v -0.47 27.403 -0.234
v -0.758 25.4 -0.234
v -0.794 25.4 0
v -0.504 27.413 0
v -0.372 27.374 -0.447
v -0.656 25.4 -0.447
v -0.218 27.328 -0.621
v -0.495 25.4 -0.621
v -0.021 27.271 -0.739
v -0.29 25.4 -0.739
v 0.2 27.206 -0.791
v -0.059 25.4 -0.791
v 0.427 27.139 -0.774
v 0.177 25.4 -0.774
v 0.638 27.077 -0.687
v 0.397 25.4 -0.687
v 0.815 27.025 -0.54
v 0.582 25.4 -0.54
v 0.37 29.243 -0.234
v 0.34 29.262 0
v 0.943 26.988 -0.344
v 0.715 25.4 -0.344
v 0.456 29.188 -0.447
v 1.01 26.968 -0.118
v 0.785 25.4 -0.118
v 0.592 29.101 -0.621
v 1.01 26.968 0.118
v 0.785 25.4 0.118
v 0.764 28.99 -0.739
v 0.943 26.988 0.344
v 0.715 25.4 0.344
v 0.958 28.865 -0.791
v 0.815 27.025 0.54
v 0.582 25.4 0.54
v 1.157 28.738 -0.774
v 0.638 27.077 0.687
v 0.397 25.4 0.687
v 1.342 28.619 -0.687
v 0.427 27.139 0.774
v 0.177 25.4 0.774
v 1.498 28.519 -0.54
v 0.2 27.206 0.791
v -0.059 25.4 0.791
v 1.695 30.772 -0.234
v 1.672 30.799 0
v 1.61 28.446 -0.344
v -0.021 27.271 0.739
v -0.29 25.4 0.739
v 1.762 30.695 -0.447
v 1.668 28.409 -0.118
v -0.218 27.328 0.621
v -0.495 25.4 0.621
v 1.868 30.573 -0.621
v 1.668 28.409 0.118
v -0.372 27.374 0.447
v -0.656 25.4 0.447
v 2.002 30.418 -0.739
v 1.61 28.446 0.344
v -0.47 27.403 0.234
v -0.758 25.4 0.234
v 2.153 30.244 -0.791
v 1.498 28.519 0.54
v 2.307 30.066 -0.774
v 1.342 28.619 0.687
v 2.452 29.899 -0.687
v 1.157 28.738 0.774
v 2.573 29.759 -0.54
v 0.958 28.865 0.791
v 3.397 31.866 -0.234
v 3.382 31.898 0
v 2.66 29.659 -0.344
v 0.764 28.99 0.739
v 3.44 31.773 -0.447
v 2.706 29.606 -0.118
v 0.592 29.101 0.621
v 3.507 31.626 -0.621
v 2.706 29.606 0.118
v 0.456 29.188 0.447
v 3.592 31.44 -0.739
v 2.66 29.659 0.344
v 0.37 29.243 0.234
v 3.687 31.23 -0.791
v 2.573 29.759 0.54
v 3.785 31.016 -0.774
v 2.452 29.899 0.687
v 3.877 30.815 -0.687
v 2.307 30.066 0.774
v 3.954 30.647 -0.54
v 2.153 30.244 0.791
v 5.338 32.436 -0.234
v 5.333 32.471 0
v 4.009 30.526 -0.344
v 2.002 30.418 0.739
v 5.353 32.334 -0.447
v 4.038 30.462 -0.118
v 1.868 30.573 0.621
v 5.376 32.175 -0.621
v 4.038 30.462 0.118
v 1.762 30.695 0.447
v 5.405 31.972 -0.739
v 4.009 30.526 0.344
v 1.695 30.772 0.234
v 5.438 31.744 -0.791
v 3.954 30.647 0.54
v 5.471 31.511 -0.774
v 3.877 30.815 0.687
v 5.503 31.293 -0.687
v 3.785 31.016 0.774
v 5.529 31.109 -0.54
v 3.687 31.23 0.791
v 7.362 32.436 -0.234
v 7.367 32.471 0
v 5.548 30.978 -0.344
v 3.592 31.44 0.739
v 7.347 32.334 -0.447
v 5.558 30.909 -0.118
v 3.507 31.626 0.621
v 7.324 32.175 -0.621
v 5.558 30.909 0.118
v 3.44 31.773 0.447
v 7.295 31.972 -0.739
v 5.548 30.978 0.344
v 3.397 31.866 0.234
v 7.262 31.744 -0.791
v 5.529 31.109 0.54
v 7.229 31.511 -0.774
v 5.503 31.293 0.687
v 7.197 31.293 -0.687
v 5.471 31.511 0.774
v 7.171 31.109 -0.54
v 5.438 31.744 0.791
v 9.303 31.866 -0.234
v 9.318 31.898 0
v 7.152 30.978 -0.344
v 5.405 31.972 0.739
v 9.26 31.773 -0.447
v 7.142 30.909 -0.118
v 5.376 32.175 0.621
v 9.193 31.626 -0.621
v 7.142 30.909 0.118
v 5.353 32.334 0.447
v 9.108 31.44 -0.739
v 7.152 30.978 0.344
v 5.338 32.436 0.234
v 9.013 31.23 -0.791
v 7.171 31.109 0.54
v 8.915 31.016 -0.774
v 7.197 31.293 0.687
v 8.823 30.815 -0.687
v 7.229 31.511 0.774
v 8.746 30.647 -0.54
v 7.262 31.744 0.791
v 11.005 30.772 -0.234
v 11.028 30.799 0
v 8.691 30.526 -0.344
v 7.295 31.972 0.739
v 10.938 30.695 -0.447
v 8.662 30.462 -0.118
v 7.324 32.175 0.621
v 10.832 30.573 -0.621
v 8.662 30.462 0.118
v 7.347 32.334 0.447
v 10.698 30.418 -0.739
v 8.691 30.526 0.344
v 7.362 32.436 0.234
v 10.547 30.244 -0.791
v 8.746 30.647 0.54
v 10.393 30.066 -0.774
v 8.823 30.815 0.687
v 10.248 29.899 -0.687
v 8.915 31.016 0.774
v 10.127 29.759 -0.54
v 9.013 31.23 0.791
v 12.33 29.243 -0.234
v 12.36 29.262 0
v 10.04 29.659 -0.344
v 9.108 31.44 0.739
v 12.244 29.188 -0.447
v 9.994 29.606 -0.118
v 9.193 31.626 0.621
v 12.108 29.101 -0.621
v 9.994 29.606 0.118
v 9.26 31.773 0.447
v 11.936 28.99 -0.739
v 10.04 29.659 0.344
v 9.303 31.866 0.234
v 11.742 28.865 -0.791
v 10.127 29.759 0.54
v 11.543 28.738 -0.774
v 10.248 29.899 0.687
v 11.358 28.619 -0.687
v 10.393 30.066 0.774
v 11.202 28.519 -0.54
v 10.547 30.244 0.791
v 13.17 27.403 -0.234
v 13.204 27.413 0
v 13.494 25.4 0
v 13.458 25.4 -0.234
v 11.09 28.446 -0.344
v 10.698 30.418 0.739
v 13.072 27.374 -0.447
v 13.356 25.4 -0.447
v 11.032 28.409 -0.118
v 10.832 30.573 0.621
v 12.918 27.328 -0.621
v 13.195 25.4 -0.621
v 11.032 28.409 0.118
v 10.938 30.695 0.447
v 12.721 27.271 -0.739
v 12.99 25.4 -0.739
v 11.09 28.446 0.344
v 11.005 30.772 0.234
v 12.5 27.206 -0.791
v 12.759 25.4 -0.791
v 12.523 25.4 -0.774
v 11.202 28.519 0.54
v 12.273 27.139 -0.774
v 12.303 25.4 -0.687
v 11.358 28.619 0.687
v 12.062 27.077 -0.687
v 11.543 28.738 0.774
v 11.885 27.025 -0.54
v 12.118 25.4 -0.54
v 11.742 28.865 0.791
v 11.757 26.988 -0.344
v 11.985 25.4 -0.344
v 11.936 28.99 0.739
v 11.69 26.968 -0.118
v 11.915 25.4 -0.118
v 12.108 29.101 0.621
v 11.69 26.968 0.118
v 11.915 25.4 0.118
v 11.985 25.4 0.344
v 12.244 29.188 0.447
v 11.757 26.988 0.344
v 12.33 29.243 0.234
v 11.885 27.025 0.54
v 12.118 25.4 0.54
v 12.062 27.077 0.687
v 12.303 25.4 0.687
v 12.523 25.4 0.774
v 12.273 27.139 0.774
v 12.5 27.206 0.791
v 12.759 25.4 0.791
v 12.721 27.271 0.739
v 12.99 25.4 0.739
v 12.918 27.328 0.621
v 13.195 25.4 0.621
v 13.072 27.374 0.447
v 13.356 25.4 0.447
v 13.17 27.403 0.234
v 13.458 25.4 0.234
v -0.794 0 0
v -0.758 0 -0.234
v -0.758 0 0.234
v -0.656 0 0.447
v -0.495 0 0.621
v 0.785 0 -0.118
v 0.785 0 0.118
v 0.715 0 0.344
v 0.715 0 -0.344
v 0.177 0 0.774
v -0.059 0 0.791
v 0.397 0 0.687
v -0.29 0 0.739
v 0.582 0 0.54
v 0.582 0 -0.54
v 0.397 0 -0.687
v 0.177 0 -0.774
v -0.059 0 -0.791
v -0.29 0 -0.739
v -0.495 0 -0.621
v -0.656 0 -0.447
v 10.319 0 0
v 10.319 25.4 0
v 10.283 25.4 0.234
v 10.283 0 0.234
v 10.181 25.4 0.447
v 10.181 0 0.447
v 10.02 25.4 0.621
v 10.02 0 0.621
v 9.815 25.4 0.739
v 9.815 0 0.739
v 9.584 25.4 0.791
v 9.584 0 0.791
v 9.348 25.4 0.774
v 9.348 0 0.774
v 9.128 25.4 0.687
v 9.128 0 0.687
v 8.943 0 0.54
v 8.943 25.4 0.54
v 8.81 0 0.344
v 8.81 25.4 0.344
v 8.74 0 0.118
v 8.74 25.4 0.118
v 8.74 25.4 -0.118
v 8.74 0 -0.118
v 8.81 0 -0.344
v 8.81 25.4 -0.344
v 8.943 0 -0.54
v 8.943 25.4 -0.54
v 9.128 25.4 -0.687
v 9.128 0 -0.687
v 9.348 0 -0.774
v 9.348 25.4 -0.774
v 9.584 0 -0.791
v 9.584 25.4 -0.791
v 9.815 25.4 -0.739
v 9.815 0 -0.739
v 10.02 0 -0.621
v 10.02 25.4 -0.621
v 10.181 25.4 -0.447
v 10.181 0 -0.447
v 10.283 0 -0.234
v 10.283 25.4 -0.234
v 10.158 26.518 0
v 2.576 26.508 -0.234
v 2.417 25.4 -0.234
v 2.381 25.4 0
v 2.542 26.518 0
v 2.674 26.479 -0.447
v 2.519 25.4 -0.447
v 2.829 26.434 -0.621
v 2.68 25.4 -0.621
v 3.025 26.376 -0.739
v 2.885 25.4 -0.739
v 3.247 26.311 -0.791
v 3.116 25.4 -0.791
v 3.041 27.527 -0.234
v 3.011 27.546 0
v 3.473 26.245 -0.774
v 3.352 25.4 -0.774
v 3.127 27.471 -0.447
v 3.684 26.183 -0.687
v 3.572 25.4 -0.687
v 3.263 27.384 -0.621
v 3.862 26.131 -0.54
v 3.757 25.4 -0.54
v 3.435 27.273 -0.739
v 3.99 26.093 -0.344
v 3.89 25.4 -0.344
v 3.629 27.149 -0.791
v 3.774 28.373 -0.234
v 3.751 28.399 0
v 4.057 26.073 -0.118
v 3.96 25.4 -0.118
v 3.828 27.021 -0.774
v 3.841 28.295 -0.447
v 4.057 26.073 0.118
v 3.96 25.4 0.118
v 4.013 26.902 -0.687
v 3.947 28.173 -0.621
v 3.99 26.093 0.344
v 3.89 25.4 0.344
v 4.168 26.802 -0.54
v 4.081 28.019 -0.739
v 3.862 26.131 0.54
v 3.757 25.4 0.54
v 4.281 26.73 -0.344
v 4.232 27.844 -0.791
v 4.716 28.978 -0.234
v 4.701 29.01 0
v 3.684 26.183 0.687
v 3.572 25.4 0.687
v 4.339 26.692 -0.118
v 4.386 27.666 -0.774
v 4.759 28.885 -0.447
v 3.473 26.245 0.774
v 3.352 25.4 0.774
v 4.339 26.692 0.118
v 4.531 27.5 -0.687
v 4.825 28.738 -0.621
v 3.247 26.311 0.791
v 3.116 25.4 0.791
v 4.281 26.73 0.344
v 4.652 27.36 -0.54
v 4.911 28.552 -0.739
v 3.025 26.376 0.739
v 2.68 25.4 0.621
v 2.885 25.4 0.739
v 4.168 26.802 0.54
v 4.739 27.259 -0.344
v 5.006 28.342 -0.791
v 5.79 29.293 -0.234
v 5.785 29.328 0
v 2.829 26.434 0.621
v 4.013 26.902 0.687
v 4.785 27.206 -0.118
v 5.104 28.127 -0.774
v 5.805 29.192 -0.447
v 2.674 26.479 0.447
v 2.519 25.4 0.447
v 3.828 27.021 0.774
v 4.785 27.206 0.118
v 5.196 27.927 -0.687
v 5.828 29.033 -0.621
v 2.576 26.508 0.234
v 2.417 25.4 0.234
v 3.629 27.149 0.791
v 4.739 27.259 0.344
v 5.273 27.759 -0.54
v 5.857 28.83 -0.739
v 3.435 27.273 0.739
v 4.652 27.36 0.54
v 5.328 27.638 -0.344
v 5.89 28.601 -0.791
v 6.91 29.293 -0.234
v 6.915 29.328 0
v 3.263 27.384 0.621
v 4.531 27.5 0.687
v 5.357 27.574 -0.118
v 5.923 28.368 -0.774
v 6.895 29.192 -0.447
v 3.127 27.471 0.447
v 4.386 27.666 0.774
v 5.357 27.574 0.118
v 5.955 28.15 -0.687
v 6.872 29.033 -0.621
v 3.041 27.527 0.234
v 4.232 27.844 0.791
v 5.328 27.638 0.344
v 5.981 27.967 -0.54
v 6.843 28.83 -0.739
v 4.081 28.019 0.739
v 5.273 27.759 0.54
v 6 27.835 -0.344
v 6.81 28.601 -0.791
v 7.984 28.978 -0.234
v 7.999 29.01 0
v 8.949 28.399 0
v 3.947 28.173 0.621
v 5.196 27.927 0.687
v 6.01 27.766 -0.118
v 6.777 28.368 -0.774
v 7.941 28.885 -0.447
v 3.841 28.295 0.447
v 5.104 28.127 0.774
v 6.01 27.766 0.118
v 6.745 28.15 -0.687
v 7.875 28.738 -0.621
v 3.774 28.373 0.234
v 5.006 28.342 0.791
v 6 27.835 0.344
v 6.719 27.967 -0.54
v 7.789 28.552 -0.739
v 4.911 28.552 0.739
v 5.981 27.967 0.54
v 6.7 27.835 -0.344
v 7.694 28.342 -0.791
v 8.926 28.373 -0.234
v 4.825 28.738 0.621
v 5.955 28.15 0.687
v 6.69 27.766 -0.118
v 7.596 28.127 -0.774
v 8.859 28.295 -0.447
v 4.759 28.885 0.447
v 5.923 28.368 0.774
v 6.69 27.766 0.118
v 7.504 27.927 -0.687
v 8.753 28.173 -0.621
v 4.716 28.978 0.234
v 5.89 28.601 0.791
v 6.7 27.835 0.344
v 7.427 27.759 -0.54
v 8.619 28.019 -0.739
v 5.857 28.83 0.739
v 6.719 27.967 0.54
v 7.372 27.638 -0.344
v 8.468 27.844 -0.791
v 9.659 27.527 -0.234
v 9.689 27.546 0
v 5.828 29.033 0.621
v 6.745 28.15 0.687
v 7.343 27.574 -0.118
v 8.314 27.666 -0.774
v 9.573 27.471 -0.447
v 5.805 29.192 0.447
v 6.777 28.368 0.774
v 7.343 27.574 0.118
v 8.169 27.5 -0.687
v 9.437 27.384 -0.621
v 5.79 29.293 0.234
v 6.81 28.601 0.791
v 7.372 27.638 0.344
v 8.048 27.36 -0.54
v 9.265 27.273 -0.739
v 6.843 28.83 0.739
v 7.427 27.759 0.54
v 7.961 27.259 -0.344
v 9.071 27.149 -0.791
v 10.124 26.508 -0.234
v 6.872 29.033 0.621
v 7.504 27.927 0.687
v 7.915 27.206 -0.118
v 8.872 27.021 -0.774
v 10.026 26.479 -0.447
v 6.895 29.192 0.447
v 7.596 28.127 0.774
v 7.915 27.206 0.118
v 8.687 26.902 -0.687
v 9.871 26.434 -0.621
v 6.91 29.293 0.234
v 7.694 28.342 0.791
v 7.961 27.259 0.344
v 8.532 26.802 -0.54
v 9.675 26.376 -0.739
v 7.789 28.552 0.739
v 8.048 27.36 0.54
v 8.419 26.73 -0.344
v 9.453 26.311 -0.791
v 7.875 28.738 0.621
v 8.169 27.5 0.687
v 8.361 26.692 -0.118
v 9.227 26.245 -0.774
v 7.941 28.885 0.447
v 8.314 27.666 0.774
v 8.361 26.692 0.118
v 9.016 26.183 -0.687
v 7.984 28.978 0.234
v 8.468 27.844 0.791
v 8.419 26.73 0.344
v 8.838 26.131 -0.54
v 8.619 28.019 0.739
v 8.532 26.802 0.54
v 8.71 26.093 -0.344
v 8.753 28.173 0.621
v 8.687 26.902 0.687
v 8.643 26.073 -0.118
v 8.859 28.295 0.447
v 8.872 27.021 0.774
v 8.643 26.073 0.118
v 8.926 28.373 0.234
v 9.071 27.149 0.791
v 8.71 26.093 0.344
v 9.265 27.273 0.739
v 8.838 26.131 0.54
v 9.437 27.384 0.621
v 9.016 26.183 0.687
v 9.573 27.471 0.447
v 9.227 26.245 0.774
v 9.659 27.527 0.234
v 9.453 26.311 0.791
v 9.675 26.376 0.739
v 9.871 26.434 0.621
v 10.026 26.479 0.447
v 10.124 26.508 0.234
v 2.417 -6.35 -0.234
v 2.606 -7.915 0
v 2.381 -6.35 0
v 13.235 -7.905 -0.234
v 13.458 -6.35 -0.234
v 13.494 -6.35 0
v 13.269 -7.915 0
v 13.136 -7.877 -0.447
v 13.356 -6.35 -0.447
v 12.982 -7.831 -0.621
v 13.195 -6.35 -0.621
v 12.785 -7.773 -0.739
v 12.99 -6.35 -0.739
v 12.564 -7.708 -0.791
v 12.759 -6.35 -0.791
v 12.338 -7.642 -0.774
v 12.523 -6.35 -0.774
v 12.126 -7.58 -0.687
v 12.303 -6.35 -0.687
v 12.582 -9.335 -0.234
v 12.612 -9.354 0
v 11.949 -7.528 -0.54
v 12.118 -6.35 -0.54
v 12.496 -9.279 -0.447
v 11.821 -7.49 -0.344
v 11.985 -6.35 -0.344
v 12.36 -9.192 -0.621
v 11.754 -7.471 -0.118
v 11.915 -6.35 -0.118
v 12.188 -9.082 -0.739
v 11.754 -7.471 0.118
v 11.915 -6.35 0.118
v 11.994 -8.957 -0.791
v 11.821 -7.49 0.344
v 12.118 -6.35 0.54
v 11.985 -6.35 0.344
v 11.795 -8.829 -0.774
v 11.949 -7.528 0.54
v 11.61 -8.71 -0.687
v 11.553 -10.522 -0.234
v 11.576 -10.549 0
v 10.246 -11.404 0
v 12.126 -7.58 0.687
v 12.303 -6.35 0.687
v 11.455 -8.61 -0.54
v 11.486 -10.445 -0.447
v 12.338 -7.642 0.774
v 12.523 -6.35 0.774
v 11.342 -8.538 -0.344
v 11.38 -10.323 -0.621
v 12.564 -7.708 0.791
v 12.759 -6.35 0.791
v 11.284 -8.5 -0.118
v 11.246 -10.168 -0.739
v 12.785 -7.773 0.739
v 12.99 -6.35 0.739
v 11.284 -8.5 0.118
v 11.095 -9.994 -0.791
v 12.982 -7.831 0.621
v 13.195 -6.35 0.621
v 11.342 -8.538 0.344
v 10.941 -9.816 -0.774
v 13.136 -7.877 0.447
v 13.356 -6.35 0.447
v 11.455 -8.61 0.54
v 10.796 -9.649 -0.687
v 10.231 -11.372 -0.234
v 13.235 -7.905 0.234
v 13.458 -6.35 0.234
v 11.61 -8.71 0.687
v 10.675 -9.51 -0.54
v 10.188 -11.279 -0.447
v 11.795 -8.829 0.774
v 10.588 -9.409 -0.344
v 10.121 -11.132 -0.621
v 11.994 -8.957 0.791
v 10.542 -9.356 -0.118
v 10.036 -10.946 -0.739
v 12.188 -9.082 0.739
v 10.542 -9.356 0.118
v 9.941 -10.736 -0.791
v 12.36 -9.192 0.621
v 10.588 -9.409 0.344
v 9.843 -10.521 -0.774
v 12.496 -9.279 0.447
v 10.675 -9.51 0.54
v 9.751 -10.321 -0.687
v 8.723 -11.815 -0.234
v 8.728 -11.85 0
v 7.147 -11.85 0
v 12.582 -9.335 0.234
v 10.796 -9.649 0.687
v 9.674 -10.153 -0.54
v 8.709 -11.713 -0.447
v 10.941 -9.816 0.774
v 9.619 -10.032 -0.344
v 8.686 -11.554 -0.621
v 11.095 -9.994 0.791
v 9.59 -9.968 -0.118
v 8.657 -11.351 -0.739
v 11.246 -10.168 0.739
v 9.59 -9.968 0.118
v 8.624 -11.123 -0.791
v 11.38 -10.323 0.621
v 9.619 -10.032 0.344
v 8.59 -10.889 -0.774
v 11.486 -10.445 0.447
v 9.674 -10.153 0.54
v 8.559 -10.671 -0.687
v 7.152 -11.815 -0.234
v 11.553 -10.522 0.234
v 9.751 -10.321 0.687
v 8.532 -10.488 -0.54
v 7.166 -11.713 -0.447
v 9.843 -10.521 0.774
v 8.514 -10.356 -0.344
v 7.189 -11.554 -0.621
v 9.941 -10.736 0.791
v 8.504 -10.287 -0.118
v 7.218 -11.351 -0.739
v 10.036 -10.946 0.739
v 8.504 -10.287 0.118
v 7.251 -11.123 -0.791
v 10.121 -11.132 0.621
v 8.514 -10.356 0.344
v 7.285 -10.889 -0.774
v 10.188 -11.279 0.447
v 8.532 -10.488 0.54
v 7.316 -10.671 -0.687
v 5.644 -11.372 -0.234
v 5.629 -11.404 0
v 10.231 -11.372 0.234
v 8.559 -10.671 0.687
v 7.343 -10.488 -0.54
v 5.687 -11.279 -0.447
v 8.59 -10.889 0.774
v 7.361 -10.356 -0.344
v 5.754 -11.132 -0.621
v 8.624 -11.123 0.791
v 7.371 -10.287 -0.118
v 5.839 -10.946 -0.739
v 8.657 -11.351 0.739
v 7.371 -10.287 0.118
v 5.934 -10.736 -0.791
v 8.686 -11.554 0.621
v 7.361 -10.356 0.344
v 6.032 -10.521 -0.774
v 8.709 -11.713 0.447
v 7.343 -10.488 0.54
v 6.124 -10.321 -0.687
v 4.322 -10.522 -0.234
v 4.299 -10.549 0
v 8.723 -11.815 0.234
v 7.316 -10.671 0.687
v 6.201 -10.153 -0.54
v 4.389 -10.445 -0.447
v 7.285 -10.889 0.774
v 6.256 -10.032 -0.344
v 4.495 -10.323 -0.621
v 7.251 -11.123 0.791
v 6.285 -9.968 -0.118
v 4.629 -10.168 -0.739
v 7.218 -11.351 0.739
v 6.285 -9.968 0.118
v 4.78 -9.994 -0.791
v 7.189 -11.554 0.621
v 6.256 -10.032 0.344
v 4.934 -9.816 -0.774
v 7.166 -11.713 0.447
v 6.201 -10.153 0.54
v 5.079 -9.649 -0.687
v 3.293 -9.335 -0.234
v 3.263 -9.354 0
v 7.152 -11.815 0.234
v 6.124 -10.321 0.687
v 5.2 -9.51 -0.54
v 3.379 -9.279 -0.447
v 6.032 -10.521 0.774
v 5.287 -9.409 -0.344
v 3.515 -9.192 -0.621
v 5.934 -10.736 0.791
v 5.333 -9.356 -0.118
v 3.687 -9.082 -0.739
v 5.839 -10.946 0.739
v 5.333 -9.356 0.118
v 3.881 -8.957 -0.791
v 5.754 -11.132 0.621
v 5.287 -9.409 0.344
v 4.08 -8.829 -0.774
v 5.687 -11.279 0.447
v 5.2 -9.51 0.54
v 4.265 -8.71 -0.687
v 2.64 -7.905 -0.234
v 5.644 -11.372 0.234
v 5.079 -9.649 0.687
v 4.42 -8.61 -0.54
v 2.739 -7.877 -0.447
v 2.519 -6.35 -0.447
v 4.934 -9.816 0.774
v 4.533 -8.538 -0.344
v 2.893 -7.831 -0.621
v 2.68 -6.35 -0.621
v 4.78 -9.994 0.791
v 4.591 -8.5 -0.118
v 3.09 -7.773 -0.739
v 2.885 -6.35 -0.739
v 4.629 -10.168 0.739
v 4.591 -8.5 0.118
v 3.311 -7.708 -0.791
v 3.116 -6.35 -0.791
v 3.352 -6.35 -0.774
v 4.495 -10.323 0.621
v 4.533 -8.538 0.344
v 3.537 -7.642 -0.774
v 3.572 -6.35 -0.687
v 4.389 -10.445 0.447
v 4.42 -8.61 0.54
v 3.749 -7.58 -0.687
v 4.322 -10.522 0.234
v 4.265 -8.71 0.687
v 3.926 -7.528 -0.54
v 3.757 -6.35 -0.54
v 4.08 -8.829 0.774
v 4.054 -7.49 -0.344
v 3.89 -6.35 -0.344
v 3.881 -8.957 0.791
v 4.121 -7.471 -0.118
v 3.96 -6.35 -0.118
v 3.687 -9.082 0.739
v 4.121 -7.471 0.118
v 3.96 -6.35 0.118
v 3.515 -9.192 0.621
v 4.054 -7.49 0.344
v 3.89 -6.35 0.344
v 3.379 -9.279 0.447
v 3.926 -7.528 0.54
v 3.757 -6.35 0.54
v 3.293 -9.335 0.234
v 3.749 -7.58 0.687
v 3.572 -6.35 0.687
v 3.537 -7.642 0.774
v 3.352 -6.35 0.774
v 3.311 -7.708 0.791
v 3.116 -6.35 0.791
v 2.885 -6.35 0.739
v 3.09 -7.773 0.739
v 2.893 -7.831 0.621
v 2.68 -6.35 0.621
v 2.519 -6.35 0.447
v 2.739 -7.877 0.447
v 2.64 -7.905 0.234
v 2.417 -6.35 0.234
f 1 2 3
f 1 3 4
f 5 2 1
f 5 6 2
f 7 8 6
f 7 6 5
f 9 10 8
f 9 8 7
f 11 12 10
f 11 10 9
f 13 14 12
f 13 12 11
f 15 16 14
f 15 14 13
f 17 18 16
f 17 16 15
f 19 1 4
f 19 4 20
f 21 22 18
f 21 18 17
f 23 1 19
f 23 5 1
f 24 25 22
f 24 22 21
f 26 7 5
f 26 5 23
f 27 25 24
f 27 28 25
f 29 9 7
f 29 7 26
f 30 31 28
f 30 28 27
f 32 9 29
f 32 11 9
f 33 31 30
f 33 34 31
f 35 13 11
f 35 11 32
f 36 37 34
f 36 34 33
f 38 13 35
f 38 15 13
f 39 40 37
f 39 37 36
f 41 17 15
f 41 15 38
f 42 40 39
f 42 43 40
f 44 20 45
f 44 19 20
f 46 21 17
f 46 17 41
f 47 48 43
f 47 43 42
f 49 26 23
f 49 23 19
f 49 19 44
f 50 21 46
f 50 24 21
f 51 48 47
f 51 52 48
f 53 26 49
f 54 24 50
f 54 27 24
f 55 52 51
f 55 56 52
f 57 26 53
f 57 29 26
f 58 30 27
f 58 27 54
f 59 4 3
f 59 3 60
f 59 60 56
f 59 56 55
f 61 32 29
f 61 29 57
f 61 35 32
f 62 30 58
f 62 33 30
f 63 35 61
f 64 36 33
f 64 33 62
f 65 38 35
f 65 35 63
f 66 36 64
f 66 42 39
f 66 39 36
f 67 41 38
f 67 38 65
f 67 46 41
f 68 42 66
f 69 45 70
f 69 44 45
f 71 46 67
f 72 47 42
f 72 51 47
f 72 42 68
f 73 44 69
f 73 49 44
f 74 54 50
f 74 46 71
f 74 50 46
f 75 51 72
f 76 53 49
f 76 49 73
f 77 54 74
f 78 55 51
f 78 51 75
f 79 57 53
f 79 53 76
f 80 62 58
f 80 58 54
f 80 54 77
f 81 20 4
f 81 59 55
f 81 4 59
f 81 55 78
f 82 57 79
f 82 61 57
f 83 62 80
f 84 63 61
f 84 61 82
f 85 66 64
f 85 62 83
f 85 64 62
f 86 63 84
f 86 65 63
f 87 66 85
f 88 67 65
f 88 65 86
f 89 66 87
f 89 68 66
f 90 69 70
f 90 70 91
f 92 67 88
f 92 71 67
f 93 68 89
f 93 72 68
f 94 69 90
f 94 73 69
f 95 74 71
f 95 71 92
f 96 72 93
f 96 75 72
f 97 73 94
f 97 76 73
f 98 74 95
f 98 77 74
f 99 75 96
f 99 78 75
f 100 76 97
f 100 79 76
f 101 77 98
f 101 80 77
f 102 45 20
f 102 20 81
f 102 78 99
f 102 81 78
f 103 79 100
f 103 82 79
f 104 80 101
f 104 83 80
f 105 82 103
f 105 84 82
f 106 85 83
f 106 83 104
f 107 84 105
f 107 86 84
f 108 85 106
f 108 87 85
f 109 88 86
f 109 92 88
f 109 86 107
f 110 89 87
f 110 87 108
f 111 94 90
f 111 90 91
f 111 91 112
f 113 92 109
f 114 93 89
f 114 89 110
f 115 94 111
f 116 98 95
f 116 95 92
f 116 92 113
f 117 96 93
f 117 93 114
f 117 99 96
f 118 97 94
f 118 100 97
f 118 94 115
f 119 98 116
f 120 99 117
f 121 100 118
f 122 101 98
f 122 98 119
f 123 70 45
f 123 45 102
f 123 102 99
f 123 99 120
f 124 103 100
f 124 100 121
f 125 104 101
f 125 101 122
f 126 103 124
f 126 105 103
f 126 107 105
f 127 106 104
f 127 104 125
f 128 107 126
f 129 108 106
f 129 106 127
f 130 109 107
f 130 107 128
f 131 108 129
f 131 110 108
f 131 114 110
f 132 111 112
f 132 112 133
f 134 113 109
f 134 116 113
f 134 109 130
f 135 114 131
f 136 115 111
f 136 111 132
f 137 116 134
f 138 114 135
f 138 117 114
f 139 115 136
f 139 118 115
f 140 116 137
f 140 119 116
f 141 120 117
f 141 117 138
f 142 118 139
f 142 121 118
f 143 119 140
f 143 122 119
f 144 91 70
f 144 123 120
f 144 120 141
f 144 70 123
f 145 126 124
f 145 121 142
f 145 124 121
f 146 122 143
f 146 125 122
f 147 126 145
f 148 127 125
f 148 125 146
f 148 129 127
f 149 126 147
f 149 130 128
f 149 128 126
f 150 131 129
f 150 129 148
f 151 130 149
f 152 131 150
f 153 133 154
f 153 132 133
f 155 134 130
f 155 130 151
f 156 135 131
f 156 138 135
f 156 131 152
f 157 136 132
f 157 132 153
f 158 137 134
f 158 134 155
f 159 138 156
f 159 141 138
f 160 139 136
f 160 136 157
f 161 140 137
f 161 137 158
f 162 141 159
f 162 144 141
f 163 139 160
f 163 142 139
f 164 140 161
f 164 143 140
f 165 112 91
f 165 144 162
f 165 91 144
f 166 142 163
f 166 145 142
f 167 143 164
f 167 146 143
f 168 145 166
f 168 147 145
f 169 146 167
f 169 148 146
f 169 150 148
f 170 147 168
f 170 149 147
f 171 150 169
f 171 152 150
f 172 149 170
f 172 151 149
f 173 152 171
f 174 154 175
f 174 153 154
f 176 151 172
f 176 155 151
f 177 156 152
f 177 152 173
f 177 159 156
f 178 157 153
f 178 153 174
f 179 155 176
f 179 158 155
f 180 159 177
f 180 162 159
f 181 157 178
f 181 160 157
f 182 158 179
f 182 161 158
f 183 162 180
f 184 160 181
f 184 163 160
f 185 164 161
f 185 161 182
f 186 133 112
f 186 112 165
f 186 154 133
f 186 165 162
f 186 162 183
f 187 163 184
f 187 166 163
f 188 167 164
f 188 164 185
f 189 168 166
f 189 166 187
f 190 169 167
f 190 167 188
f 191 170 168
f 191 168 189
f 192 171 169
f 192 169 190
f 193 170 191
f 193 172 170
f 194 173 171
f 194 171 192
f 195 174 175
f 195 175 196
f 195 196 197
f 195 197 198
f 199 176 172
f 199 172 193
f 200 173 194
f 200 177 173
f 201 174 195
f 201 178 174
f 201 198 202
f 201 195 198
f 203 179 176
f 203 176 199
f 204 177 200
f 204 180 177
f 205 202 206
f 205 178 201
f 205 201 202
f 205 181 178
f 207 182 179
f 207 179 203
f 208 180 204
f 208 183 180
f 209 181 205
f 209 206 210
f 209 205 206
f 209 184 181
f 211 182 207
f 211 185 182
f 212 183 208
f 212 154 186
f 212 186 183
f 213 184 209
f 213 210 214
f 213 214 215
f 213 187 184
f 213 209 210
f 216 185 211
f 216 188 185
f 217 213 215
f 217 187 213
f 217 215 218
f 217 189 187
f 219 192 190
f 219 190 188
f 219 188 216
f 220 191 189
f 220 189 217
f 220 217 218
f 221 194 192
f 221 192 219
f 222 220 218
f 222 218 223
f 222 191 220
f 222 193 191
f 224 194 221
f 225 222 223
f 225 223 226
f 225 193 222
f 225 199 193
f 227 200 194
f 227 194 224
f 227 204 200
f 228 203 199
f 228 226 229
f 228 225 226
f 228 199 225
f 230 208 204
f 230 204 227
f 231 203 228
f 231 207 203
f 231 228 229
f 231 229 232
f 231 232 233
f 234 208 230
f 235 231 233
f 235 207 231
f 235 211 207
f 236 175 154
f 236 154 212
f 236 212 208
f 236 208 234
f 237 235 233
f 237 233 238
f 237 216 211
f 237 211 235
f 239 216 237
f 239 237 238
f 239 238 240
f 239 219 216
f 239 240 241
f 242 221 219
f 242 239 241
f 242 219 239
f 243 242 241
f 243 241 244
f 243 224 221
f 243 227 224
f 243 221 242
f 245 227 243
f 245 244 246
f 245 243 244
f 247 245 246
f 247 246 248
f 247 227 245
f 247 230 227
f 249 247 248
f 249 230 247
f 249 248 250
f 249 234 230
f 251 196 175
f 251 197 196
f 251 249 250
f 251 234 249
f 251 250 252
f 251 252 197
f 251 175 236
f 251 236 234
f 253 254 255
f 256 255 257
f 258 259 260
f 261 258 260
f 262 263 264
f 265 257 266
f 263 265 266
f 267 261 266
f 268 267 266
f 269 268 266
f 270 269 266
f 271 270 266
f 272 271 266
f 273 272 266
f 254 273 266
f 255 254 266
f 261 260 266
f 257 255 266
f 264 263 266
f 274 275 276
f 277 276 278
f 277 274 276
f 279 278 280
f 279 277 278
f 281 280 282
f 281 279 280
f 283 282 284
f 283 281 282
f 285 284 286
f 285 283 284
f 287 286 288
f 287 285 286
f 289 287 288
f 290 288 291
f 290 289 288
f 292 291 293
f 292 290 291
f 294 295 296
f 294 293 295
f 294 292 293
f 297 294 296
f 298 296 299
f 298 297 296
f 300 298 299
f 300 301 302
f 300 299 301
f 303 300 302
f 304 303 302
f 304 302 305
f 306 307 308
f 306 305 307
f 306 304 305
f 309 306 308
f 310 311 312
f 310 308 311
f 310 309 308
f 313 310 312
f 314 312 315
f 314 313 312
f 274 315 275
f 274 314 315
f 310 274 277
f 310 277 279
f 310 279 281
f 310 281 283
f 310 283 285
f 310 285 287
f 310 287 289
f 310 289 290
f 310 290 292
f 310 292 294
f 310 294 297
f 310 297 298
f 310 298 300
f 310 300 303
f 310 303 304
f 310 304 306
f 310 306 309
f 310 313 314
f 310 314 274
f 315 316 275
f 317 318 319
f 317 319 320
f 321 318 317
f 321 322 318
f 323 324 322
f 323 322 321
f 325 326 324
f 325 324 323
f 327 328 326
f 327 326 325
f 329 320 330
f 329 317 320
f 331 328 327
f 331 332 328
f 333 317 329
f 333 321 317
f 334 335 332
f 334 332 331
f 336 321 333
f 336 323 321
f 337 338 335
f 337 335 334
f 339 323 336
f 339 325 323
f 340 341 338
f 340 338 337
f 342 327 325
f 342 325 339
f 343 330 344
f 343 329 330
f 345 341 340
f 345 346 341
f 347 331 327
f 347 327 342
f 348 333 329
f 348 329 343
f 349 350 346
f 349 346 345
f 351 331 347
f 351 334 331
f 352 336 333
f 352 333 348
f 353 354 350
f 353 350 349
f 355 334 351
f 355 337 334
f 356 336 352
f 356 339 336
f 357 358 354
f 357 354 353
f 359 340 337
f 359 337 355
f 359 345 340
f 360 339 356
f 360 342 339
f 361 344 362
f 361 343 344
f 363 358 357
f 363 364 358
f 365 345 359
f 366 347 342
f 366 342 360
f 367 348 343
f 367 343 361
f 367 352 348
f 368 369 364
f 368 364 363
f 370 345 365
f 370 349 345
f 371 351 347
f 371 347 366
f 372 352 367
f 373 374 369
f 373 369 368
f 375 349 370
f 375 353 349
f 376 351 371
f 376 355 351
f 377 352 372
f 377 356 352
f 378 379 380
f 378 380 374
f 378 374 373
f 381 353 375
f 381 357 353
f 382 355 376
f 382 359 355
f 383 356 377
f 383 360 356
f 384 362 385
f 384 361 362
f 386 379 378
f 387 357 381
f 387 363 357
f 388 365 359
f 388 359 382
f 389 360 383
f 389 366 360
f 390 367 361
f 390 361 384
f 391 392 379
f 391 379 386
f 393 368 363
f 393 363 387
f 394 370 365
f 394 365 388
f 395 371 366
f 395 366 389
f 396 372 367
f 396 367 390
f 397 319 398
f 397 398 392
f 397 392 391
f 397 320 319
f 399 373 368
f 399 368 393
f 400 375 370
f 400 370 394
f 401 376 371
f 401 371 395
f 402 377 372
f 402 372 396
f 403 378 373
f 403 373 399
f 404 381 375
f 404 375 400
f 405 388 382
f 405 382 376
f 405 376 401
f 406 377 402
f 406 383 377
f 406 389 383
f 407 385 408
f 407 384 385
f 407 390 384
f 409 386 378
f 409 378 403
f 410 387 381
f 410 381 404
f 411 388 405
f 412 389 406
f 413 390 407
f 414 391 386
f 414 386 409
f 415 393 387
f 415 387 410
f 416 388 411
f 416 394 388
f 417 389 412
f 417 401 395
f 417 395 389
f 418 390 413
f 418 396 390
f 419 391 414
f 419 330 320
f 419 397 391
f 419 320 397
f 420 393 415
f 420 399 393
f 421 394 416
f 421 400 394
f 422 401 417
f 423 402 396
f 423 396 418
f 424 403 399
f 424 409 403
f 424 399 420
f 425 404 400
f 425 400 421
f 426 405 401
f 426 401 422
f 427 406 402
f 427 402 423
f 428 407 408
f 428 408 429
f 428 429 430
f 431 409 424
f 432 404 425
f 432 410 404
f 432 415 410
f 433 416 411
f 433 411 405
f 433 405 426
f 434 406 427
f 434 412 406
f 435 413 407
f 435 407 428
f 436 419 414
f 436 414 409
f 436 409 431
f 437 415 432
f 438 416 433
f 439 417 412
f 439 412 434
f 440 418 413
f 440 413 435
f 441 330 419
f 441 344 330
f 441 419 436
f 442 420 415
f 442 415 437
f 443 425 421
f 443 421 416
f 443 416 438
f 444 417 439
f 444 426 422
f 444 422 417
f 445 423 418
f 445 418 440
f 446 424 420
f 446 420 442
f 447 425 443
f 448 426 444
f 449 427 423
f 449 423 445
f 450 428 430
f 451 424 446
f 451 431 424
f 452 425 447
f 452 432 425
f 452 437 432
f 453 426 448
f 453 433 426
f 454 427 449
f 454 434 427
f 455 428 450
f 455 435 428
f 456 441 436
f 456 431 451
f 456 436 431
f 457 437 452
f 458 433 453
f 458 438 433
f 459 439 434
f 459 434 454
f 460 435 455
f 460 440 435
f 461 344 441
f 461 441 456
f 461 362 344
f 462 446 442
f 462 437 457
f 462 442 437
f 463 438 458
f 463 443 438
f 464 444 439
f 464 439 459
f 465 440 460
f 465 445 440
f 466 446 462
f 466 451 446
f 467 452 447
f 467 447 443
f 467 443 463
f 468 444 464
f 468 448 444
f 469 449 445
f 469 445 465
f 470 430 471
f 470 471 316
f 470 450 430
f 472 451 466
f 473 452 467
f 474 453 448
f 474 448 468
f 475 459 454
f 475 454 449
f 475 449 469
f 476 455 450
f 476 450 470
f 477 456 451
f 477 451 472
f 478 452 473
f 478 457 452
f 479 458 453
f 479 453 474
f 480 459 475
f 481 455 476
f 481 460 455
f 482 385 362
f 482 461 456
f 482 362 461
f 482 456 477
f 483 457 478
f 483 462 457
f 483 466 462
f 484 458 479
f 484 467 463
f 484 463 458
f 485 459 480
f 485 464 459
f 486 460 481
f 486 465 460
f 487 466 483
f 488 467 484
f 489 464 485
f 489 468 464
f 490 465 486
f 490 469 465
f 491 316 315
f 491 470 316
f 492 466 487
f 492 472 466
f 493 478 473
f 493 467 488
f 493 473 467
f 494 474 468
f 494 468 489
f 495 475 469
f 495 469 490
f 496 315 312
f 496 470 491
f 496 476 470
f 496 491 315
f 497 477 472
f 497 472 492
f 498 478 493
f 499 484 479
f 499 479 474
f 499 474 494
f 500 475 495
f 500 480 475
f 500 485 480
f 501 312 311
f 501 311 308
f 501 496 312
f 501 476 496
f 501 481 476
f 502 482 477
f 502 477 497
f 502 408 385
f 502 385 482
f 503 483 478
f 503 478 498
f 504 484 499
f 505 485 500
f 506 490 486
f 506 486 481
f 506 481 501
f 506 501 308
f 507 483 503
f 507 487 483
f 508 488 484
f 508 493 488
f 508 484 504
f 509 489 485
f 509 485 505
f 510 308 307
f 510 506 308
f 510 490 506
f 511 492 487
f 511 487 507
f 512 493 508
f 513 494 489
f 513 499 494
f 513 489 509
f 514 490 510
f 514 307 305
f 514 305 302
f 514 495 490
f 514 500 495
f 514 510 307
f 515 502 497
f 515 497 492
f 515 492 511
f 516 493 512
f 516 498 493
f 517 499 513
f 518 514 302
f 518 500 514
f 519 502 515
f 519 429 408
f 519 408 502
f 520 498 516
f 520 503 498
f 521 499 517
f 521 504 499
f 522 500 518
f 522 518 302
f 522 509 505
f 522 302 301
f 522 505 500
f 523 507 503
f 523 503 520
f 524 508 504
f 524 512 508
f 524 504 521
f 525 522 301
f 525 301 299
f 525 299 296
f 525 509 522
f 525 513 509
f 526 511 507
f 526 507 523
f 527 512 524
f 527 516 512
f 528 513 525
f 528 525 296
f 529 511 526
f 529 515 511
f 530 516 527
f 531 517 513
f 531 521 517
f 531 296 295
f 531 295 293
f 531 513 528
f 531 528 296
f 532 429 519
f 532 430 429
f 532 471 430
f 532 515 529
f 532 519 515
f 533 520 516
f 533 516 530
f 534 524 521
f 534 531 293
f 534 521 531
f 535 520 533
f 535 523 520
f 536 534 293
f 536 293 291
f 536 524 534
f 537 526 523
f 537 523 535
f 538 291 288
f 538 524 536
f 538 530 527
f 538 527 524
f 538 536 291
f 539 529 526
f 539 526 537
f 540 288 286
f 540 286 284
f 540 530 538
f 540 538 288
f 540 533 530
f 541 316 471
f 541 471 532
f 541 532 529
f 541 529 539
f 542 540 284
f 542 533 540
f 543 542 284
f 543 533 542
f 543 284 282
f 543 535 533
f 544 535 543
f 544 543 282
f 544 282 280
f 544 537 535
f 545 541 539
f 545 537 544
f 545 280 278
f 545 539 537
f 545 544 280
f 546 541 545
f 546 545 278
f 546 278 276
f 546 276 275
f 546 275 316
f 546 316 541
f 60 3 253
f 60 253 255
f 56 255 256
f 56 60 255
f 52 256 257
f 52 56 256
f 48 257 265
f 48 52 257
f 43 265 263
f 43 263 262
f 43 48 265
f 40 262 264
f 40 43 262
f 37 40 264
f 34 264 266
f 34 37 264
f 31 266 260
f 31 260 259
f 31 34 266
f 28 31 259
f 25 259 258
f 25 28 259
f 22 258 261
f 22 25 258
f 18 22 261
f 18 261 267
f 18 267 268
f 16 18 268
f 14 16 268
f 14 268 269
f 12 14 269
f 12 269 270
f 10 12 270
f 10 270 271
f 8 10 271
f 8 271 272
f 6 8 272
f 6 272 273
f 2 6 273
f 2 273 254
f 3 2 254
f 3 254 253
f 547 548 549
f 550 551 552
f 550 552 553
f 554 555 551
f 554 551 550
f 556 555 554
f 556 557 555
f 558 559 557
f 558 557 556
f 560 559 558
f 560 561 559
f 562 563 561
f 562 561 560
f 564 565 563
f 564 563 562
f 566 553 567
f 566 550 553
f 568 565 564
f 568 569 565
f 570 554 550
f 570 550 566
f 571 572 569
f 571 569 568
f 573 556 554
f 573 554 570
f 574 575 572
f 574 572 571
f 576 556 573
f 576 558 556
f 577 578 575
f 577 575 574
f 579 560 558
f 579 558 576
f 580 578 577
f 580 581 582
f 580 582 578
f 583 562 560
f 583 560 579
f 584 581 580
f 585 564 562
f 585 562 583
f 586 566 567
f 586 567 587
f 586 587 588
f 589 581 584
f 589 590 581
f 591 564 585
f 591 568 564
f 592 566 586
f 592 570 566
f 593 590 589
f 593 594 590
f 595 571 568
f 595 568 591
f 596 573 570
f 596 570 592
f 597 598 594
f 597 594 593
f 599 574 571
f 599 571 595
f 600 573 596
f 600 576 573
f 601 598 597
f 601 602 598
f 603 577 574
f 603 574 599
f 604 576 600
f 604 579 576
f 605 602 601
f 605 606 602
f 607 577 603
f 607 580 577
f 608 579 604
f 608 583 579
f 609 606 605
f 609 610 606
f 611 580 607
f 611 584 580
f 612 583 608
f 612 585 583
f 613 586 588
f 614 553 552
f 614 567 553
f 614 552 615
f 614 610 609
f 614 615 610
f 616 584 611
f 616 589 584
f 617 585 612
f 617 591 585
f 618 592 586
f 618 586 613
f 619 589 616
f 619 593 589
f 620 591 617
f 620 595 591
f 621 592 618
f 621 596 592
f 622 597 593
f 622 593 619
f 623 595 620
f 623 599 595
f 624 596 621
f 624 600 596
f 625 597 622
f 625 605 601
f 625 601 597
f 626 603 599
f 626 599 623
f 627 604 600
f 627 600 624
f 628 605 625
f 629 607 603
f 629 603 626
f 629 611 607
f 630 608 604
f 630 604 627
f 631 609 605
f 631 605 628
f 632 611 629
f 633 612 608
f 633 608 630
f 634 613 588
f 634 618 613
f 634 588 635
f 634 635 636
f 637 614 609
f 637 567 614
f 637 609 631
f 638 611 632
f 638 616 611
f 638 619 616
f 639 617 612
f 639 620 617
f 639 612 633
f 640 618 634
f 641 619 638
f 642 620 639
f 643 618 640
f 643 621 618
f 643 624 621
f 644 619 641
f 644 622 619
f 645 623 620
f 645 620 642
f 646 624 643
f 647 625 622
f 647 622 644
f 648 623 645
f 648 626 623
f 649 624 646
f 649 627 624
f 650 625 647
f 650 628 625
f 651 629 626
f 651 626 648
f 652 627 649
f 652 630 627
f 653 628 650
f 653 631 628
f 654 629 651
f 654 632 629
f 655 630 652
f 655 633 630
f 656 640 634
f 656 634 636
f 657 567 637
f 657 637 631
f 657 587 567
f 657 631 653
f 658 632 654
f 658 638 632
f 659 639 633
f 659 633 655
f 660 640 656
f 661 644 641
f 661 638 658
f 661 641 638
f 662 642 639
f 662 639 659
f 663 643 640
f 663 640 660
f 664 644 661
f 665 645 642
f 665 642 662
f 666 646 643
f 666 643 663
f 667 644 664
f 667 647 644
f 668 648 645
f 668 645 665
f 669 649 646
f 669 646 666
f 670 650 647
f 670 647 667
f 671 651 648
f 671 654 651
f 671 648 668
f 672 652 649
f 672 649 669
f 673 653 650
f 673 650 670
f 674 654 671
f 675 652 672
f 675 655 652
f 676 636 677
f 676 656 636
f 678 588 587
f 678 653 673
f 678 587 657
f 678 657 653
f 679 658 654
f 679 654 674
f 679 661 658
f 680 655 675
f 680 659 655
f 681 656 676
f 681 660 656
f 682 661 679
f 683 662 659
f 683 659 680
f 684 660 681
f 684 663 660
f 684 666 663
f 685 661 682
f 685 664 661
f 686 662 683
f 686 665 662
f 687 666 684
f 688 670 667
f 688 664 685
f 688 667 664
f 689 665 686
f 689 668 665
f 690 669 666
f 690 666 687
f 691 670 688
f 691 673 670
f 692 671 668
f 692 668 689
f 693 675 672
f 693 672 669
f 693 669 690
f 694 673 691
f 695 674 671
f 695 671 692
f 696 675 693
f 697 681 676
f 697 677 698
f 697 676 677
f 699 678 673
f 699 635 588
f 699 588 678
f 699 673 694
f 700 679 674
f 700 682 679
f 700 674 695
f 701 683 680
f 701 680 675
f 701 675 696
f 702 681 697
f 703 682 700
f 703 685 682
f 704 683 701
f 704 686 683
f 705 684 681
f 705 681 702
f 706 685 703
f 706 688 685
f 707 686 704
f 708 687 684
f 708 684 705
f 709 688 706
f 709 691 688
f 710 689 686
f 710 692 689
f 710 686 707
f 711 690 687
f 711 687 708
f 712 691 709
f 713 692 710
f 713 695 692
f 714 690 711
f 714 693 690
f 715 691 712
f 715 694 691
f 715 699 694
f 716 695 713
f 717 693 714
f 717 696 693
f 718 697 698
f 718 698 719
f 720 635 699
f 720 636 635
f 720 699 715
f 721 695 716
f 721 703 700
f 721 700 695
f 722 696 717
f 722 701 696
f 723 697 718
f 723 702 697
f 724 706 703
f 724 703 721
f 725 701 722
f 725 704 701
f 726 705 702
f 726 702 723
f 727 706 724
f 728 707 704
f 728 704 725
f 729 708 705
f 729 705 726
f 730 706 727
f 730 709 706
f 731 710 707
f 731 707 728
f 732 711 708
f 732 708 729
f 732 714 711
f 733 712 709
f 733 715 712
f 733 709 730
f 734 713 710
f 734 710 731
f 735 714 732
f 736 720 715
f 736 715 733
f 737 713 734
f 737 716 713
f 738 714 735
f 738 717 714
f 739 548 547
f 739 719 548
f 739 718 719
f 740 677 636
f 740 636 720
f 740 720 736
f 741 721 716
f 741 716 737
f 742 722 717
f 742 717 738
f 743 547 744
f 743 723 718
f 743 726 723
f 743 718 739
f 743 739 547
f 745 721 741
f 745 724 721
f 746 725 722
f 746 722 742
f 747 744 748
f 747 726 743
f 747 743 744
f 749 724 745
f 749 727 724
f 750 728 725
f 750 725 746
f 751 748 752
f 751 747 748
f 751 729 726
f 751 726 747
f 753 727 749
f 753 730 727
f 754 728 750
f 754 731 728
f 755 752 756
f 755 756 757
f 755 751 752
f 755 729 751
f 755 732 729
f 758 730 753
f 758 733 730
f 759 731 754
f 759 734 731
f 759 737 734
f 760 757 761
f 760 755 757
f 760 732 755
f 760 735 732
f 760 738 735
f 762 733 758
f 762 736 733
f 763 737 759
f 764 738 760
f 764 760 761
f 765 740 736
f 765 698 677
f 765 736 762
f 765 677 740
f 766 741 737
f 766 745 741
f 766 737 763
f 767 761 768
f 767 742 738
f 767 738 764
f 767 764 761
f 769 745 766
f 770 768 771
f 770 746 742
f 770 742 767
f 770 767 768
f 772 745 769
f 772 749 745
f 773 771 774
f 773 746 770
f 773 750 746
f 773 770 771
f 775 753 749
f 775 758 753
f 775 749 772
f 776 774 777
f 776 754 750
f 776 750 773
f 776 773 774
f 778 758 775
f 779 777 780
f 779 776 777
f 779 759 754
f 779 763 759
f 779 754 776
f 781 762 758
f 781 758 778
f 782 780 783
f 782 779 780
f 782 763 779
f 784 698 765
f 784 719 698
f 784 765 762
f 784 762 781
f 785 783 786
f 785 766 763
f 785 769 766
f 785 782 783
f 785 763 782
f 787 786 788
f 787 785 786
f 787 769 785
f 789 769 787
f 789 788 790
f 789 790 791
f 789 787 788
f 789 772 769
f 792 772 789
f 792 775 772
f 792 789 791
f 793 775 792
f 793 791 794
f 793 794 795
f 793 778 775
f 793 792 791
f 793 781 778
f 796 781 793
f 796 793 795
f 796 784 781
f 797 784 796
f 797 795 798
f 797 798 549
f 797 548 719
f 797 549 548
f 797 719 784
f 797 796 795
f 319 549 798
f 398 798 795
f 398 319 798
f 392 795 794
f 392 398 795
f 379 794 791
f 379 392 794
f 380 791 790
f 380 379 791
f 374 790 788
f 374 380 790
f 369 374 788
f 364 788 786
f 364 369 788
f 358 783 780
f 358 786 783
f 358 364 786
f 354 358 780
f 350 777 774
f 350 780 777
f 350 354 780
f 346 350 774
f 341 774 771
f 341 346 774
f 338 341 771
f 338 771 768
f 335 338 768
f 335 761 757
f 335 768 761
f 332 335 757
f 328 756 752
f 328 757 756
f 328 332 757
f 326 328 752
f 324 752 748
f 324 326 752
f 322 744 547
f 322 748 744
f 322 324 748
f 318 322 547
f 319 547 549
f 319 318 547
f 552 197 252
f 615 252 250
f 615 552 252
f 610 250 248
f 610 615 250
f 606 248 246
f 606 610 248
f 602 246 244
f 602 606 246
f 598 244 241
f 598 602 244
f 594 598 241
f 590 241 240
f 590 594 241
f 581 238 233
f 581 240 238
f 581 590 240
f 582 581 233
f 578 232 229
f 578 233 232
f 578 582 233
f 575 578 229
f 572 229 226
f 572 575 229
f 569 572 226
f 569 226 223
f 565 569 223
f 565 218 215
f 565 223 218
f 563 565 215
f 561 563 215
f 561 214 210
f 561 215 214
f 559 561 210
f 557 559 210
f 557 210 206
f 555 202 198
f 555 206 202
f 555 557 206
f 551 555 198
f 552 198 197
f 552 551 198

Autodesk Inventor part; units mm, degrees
ref_plane "YZ Plane" through (0, 0, 0) normal (1, 0, 0) x (0, 1, 0)
ref_plane "XZ Plane" through (0, 0, 0) normal (0, 1, 0) x (-1, 0, 0)
sketch "Sketch1" plane through (0, 0, 0) normal (0, 0, 1) x (1, 0, 0)
  line L0 (0, 0) -> (0, 25.4)
  line L1 (3.175, 25.4) -> (3.175, -6.35)
  line L2 (9.525, 0) -> (9.525, 25.4)
  line L3 (12.7, 25.4) -> (12.7, -6.35)
  arc A0 (9.525, 25.4) -> (3.175, 25.4) centre (6.35, 25.4) ccw
  arc A1 (12.7, 25.4) -> (0, 25.4) centre (6.35, 25.4) ccw
  arc A2 (3.175, -6.35) -> (12.7, -6.35) centre (7.9375, -6.35) ccw
  dimension "d0" = 25.4
  dimension "d1" = 31.75
  dimension "d2" = 3.175
  dimension "d3" = 6.35
  dimension "d4" = 3.175
ref_plane "Work Plane1" through (0, 0, 0) normal (0, 1, 0) x (-1, 0, 0)
sketch "Sketch2" plane through (0, 0, 0) normal (0, 1, 0) x (-1, 0, 0)
  circle A0 centre (0, 0) radius 0.7937
  dimension "d5" = 1.5875
sweep "Sweep1" add profiles "Sketch2" path "Sketch1"
properties part number "arthurWeiActivity 5.5a paperclip"
